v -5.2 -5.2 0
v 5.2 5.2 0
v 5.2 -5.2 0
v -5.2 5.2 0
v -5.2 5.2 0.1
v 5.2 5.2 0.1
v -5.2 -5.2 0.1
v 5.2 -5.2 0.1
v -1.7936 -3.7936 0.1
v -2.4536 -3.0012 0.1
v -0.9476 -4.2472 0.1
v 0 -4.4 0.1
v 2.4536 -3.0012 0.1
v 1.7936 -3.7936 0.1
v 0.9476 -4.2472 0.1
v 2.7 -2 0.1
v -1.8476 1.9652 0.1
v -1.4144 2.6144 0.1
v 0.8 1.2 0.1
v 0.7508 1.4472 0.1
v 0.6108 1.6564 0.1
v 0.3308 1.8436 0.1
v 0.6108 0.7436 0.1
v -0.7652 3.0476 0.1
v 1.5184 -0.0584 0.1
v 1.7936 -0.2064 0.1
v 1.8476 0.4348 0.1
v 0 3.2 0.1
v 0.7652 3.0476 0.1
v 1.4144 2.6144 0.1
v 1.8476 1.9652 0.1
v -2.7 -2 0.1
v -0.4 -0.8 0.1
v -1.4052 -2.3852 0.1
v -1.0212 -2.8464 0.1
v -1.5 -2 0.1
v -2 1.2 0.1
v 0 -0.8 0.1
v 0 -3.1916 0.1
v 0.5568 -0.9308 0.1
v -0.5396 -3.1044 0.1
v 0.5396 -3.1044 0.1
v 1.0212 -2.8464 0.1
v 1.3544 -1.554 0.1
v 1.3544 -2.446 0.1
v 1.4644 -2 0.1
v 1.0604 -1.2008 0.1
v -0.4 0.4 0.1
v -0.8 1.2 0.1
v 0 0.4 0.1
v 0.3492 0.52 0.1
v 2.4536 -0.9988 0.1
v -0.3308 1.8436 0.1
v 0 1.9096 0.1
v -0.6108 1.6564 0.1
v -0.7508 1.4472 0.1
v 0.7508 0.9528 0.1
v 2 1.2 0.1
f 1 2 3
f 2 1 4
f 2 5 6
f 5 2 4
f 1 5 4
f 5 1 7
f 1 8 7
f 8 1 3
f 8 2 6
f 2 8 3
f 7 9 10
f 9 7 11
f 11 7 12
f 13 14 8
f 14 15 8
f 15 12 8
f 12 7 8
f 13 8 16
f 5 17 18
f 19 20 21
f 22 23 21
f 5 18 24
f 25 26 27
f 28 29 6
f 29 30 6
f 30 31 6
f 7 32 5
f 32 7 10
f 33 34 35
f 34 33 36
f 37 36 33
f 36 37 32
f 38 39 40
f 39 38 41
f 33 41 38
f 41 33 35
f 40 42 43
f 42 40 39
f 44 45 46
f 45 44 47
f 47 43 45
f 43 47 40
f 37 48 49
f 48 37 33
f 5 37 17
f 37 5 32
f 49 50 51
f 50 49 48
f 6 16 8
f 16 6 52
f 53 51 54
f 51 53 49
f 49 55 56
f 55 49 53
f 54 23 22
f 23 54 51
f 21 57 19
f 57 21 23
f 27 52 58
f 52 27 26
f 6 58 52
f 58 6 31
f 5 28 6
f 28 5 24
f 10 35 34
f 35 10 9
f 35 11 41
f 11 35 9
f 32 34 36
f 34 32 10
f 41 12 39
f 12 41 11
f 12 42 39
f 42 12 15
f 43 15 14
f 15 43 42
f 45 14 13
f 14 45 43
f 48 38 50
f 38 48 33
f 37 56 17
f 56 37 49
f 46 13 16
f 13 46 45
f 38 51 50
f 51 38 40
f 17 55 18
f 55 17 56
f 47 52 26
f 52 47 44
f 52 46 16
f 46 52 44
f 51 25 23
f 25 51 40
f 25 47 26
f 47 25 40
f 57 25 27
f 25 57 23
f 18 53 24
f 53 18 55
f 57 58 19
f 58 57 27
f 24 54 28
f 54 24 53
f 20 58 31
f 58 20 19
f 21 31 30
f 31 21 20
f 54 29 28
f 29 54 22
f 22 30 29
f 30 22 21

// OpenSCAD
// file: ../p/box5-12.scad
use <../lib.scad>
function ldraw_lib__box5_12() = [
// 0 Box with 5 Faces without Any Edges
// 0 Name: box5-12.dat
// 0 Author: Chris Dee [cwdee]
// 0 !LDRAW_ORG Primitive UPDATE 2009-02
// 0 !LICENSE Licensed under CC BY 4.0 : see CAreadme.txt
// 
// 0 BFC CERTIFY CCW
  [0,"BFC","CERTIFY"],
  [0,"BFC","CCW"],
// 
// 0 !HISTORY 2009-09-03 [PTadmin] Official Update 2009-02
// 
// 
// 4 16 1 1 1 1 1 -1 -1 1 -1 -1 1 1
  [4,16,1,1,1,1,1,-1,-1,1,-1,-1,1,1],
// 4 16 -1 0 1 1 0 1 1 1 1 -1 1 1
  [4,16,-1,0,1,1,0,1,1,1,1,-1,1,1],
// 4 16 -1 0 -1 -1 0 1 -1 1 1 -1 1 -1
  [4,16,-1,0,-1,-1,0,1,-1,1,1,-1,1,-1],
// 4 16 1 0 -1 -1 0 -1 -1 1 -1 1 1 -1
  [4,16,1,0,-1,-1,0,-1,-1,1,-1,1,1,-1],
// 4 16 1 0 1 1 0 -1 1 1 -1 1 1 1
  [4,16,1,0,1,1,0,-1,1,1,-1,1,1,1],
// 0
];
module ldraw_lib__box5_12(step=0, col=false, unit=2/5, alt=false, line=0.2, solid=!$preview)
    makepoly(ldraw_lib__box5_12(), step=step, col=col, unit=unit, alt=alt, line=line, solid=solid);
ldraw_lib__box5_12(line=0.2);
// main file
use <../lib.scad>
use <../p/box5-12.scad>
function ldraw_lib__169665g() = [
// 0 Sticker  1.3 x  1.3 with Black Number "3"
// 0 Name: 169665g.dat
// 0 Author: Chris Böhnke [KnightOfTarenta]
// 0 !LDRAW_ORG Part UPDATE 2026-06
// 0 !LICENSE Licensed under CC BY 4.0 : see CAreadme.txt
// 
// 0 BFC CERTIFY CCW
  [0,"BFC","CERTIFY"],
  [0,"BFC","CCW"],
// 
// 0 !KEYWORDS Booster Rocket, Bricklink 6339stk01, Brickowl 588738, Launch Command
// 0 !KEYWORDS Rebrickable 169665, set 6339, Shuttle Launch Pad, space port, town
// 
// 0 !HISTORY 2026-06-28 [OrionP] Official Update 2026-06
// 
// 1 16 0 -0.25 0 13 0 0 0 .25 0 0 0 13 box5-12.dat
  [1,16,0,-0.25,0,13,0,0,0,.25,0,0,0,13, ldraw_lib__box5_12()],
// 
// 0 // Colour 16 Main Colour
// 3 16 -13 -.25 -13 -4.484 -.25 -9.484 -6.134 -.25 -7.503
  [3,16,-13,-.25,-13,-4.484,-.25,-9.484,-6.134,-.25,-7.503],
// 3 16 -4.484 -.25 -9.484 -13 -.25 -13 -2.369 -.25 -10.618
  [3,16,-4.484,-.25,-9.484,-13,-.25,-13,-2.369,-.25,-10.618],
// 3 16 -2.369 -.25 -10.618 -13 -.25 -13 0 -.25 -11
  [3,16,-2.369,-.25,-10.618,-13,-.25,-13,0,-.25,-11],
// 3 16 6.134 -.25 -7.503 4.484 -.25 -9.484 13 -.25 -13
  [3,16,6.134,-.25,-7.503,4.484,-.25,-9.484,13,-.25,-13],
// 3 16 4.484 -.25 -9.484 2.369 -.25 -10.618 13 -.25 -13
  [3,16,4.484,-.25,-9.484,2.369,-.25,-10.618,13,-.25,-13],
// 3 16 2.369 -.25 -10.618 0 -.25 -11 13 -.25 -13
  [3,16,2.369,-.25,-10.618,0,-.25,-11,13,-.25,-13],
// 3 16 0 -.25 -11 -13 -.25 -13 13 -.25 -13
  [3,16,0,-.25,-11,-13,-.25,-13,13,-.25,-13],
// 3 16 6.134 -.25 -7.503 13 -.25 -13 6.75 -.25 -5
  [3,16,6.134,-.25,-7.503,13,-.25,-13,6.75,-.25,-5],
// 3 16 -13 -.25 13 -4.619 -.25 4.913 -3.536 -.25 6.536
  [3,16,-13,-.25,13,-4.619,-.25,4.913,-3.536,-.25,6.536],
// 3 16 2 -.25 3 1.877 -.25 3.618 1.527 -.25 4.141
  [3,16,2,-.25,3,1.877,-.25,3.618,1.527,-.25,4.141],
// 3 16 .827 -.25 4.609 1.527 -.25 1.859 1.527 -.25 4.141
  [3,16,.827,-.25,4.609,1.527,-.25,1.859,1.527,-.25,4.141],
// 3 16 -13 -.25 13 -3.536 -.25 6.536 -1.913 -.25 7.619
  [3,16,-13,-.25,13,-3.536,-.25,6.536,-1.913,-.25,7.619],
// 3 16 3.796 -.25 -.146 4.484 -.25 -.516 4.619 -.25 1.087
  [3,16,3.796,-.25,-.146,4.484,-.25,-.516,4.619,-.25,1.087],
// 3 16 0 -.25 8 1.913 -.25 7.619 13 -.25 13
  [3,16,0,-.25,8,1.913,-.25,7.619,13,-.25,13],
// 3 16 1.913 -.25 7.619 3.536 -.25 6.536 13 -.25 13
  [3,16,1.913,-.25,7.619,3.536,-.25,6.536,13,-.25,13],
// 3 16 3.536 -.25 6.536 4.619 -.25 4.913 13 -.25 13
  [3,16,3.536,-.25,6.536,4.619,-.25,4.913,13,-.25,13],
// 4 16 -13 -.25 13 -13 -.25 -13 -6.134 -.25 -7.503 -6.75 -.25 -5
  [4,16,-13,-.25,13,-13,-.25,-13,-6.134,-.25,-7.503,-6.75,-.25,-5],
// 4 16 -1 -.25 -2 -3.75 -.25 -5 -3.513 -.25 -5.963 -2.553 -.25 -7.116
  [4,16,-1,-.25,-2,-3.75,-.25,-5,-3.513,-.25,-5.963,-2.553,-.25,-7.116],
// 4 16 -6.75 -.25 -5 -3.75 -.25 -5 -1 -.25 -2 -5 -.25 3
  [4,16,-6.75,-.25,-5,-3.75,-.25,-5,-1,-.25,-2,-5,-.25,3],
// 4 16 1.392 -.25 -2.327 0 -.25 -2 -1.349 -.25 -7.761 0 -.25 -7.979
  [4,16,1.392,-.25,-2.327,0,-.25,-2,-1.349,-.25,-7.761,0,-.25,-7.979],
// 4 16 -2.553 -.25 -7.116 -1.349 -.25 -7.761 0 -.25 -2 -1 -.25 -2
  [4,16,-2.553,-.25,-7.116,-1.349,-.25,-7.761,0,-.25,-2,-1,-.25,-2],
// 4 16 2.553 -.25 -7.116 1.392 -.25 -2.327 0 -.25 -7.979 1.349 -.25 -7.761
  [4,16,2.553,-.25,-7.116,1.392,-.25,-2.327,0,-.25,-7.979,1.349,-.25,-7.761],
// 4 16 3.661 -.25 -5 3.386 -.25 -3.885 2.651 -.25 -3.002 3.386 -.25 -6.115
  [4,16,3.661,-.25,-5,3.386,-.25,-3.885,2.651,-.25,-3.002,3.386,-.25,-6.115],
// 4 16 3.386 -.25 -6.115 2.651 -.25 -3.002 1.392 -.25 -2.327 2.553 -.25 -7.116
  [4,16,3.386,-.25,-6.115,2.651,-.25,-3.002,1.392,-.25,-2.327,2.553,-.25,-7.116],
// 4 16 -2 -.25 3 -5 -.25 3 -1 -.25 -2 -1 -.25 1
  [4,16,-2,-.25,3,-5,-.25,3,-1,-.25,-2,-1,-.25,1],
// 4 16 -6.75 -.25 -5 -5 -.25 3 -4.619 -.25 4.913 -13 -.25 13
  [4,16,-6.75,-.25,-5,-5,-.25,3,-4.619,-.25,4.913,-13,-.25,13],
// 4 16 .873 -.25 1.3 -2 -.25 3 -1 -.25 1 0 -.25 1
  [4,16,.873,-.25,1.3,-2,-.25,3,-1,-.25,1,0,-.25,1],
// 4 16 13 -.25 13 6.134 -.25 -2.497 6.75 -.25 -5 13 -.25 -13
  [4,16,13,-.25,13,6.134,-.25,-2.497,6.75,-.25,-5,13,-.25,-13],
// 4 16 0 -.25 4.774 -.827 -.25 4.609 -2 -.25 3 .873 -.25 1.3
  [4,16,0,-.25,4.774,-.827,-.25,4.609,-2,-.25,3,.873,-.25,1.3],
// 4 16 -1.877 -.25 3.618 -2 -.25 3 -.827 -.25 4.609 -1.527 -.25 4.141
  [4,16,-1.877,-.25,3.618,-2,-.25,3,-.827,-.25,4.609,-1.527,-.25,4.141],
// 4 16 .827 -.25 4.609 0 -.25 4.774 .873 -.25 1.3 1.527 -.25 1.859
  [4,16,.827,-.25,4.609,0,-.25,4.774,.873,-.25,1.3,1.527,-.25,1.859],
// 4 16 1.877 -.25 2.382 2 -.25 3 1.527 -.25 4.141 1.527 -.25 1.859
  [4,16,1.877,-.25,2.382,2,-.25,3,1.527,-.25,4.141,1.527,-.25,1.859],
// 4 16 5 -.25 3 4.619 -.25 1.087 4.484 -.25 -.516 6.134 -.25 -2.497
  [4,16,5,-.25,3,4.619,-.25,1.087,4.484,-.25,-.516,6.134,-.25,-2.497],
// 4 16 4.619 -.25 4.913 5 -.25 3 6.134 -.25 -2.497 13 -.25 13
  [4,16,4.619,-.25,4.913,5,-.25,3,6.134,-.25,-2.497,13,-.25,13],
// 4 16 -1.913 -.25 7.619 0 -.25 8 13 -.25 13 -13 -.25 13
  [4,16,-1.913,-.25,7.619,0,-.25,8,13,-.25,13,-13,-.25,13],
// 
// 0 BFC NOCLIP
  [0,"BFC","NOCLIP"],
// 0 // Colour 0 Black
// 4 0 -4.484 -.25 -9.484 -2.553 -.25 -7.116 -3.513 -.25 -5.963 -6.134 -.25 -7.503
  [4,0,-4.484,-.25,-9.484,-2.553,-.25,-7.116,-3.513,-.25,-5.963,-6.134,-.25,-7.503],
// 4 0 -4.484 -.25 -9.484 -2.369 -.25 -10.618 -1.349 -.25 -7.761 -2.553 -.25 -7.116
  [4,0,-4.484,-.25,-9.484,-2.369,-.25,-10.618,-1.349,-.25,-7.761,-2.553,-.25,-7.116],
// 4 0 -6.134 -.25 -7.503 -3.513 -.25 -5.963 -3.75 -.25 -5 -6.75 -.25 -5
  [4,0,-6.134,-.25,-7.503,-3.513,-.25,-5.963,-3.75,-.25,-5,-6.75,-.25,-5],
// 4 0 -2.369 -.25 -10.618 0 -.25 -11 0 -.25 -7.979 -1.349 -.25 -7.761
  [4,0,-2.369,-.25,-10.618,0,-.25,-11,0,-.25,-7.979,-1.349,-.25,-7.761],
// 4 0 2.369 -.25 -10.618 1.349 -.25 -7.761 0 -.25 -7.979 0 -.25 -11
  [4,0,2.369,-.25,-10.618,1.349,-.25,-7.761,0,-.25,-7.979,0,-.25,-11],
// 4 0 4.484 -.25 -9.484 2.553 -.25 -7.116 1.349 -.25 -7.761 2.369 -.25 -10.618
  [4,0,4.484,-.25,-9.484,2.553,-.25,-7.116,1.349,-.25,-7.761,2.369,-.25,-10.618],
// 4 0 2.553 -.25 -7.116 4.484 -.25 -9.484 6.134 -.25 -7.503 3.386 -.25 -6.115
  [4,0,2.553,-.25,-7.116,4.484,-.25,-9.484,6.134,-.25,-7.503,3.386,-.25,-6.115],
// 4 0 0 -.25 -2 0 -.25 1 -1 -.25 1 -1 -.25 -2
  [4,0,0,-.25,-2,0,-.25,1,-1,-.25,1,-1,-.25,-2],
// 4 0 -4.619 -.25 4.913 -5 -.25 3 -2 -.25 3 -1.877 -.25 3.618
  [4,0,-4.619,-.25,4.913,-5,-.25,3,-2,-.25,3,-1.877,-.25,3.618],
// 4 0 3.386 -.25 -6.115 6.134 -.25 -7.503 6.75 -.25 -5 3.661 -.25 -5
  [4,0,3.386,-.25,-6.115,6.134,-.25,-7.503,6.75,-.25,-5,3.661,-.25,-5],
// 4 0 0 -.25 1 0 -.25 -2 1.392 -.25 -2.327 .873 -.25 1.3
  [4,0,0,-.25,1,0,-.25,-2,1.392,-.25,-2.327,.873,-.25,1.3],
// 4 0 -3.536 -.25 6.536 -4.619 -.25 4.913 -1.877 -.25 3.618 -1.527 -.25 4.141
  [4,0,-3.536,-.25,6.536,-4.619,-.25,4.913,-1.877,-.25,3.618,-1.527,-.25,4.141],
// 4 0 4.484 -.25 -.516 2.651 -.25 -3.002 3.386 -.25 -3.885 6.134 -.25 -2.497
  [4,0,4.484,-.25,-.516,2.651,-.25,-3.002,3.386,-.25,-3.885,6.134,-.25,-2.497],
// 4 0 6.75 -.25 -5 6.134 -.25 -2.497 3.386 -.25 -3.885 3.661 -.25 -5
  [4,0,6.75,-.25,-5,6.134,-.25,-2.497,3.386,-.25,-3.885,3.661,-.25,-5],
// 4 0 1.392 -.25 -2.327 3.796 -.25 -.146 1.527 -.25 1.859 .873 -.25 1.3
  [4,0,1.392,-.25,-2.327,3.796,-.25,-.146,1.527,-.25,1.859,.873,-.25,1.3],
// 4 0 4.484 -.25 -.516 3.796 -.25 -.146 1.392 -.25 -2.327 2.651 -.25 -3.002
  [4,0,4.484,-.25,-.516,3.796,-.25,-.146,1.392,-.25,-2.327,2.651,-.25,-3.002],
// 4 0 1.527 -.25 1.859 3.796 -.25 -.146 4.619 -.25 1.087 1.877 -.25 2.382
  [4,0,1.527,-.25,1.859,3.796,-.25,-.146,4.619,-.25,1.087,1.877,-.25,2.382],
// 4 0 -1.527 -.25 4.141 -.827 -.25 4.609 -1.913 -.25 7.619 -3.536 -.25 6.536
  [4,0,-1.527,-.25,4.141,-.827,-.25,4.609,-1.913,-.25,7.619,-3.536,-.25,6.536],
// 4 0 4.619 -.25 1.087 5 -.25 3 2 -.25 3 1.877 -.25 2.382
  [4,0,4.619,-.25,1.087,5,-.25,3,2,-.25,3,1.877,-.25,2.382],
// 4 0 -.827 -.25 4.609 0 -.25 4.774 0 -.25 8 -1.913 -.25 7.619
  [4,0,-.827,-.25,4.609,0,-.25,4.774,0,-.25,8,-1.913,-.25,7.619],
// 4 0 2 -.25 3 5 -.25 3 4.619 -.25 4.913 1.877 -.25 3.618
  [4,0,2,-.25,3,5,-.25,3,4.619,-.25,4.913,1.877,-.25,3.618],
// 4 0 3.536 -.25 6.536 1.527 -.25 4.141 1.877 -.25 3.618 4.619 -.25 4.913
  [4,0,3.536,-.25,6.536,1.527,-.25,4.141,1.877,-.25,3.618,4.619,-.25,4.913],
// 4 0 .827 -.25 4.609 1.913 -.25 7.619 0 -.25 8 0 -.25 4.774
  [4,0,.827,-.25,4.609,1.913,-.25,7.619,0,-.25,8,0,-.25,4.774],
// 4 0 1.527 -.25 4.141 3.536 -.25 6.536 1.913 -.25 7.619 .827 -.25 4.609
  [4,0,1.527,-.25,4.141,3.536,-.25,6.536,1.913,-.25,7.619,.827,-.25,4.609],
];
module ldraw_lib__169665g(step=0, col=false, unit=2/5, alt=false, line=0.2, solid=!$preview)
    makepoly(ldraw_lib__169665g(), step=step, col=col, unit=unit, alt=alt, line=line, solid=solid);
ldraw_lib__169665g(line=0.2);
